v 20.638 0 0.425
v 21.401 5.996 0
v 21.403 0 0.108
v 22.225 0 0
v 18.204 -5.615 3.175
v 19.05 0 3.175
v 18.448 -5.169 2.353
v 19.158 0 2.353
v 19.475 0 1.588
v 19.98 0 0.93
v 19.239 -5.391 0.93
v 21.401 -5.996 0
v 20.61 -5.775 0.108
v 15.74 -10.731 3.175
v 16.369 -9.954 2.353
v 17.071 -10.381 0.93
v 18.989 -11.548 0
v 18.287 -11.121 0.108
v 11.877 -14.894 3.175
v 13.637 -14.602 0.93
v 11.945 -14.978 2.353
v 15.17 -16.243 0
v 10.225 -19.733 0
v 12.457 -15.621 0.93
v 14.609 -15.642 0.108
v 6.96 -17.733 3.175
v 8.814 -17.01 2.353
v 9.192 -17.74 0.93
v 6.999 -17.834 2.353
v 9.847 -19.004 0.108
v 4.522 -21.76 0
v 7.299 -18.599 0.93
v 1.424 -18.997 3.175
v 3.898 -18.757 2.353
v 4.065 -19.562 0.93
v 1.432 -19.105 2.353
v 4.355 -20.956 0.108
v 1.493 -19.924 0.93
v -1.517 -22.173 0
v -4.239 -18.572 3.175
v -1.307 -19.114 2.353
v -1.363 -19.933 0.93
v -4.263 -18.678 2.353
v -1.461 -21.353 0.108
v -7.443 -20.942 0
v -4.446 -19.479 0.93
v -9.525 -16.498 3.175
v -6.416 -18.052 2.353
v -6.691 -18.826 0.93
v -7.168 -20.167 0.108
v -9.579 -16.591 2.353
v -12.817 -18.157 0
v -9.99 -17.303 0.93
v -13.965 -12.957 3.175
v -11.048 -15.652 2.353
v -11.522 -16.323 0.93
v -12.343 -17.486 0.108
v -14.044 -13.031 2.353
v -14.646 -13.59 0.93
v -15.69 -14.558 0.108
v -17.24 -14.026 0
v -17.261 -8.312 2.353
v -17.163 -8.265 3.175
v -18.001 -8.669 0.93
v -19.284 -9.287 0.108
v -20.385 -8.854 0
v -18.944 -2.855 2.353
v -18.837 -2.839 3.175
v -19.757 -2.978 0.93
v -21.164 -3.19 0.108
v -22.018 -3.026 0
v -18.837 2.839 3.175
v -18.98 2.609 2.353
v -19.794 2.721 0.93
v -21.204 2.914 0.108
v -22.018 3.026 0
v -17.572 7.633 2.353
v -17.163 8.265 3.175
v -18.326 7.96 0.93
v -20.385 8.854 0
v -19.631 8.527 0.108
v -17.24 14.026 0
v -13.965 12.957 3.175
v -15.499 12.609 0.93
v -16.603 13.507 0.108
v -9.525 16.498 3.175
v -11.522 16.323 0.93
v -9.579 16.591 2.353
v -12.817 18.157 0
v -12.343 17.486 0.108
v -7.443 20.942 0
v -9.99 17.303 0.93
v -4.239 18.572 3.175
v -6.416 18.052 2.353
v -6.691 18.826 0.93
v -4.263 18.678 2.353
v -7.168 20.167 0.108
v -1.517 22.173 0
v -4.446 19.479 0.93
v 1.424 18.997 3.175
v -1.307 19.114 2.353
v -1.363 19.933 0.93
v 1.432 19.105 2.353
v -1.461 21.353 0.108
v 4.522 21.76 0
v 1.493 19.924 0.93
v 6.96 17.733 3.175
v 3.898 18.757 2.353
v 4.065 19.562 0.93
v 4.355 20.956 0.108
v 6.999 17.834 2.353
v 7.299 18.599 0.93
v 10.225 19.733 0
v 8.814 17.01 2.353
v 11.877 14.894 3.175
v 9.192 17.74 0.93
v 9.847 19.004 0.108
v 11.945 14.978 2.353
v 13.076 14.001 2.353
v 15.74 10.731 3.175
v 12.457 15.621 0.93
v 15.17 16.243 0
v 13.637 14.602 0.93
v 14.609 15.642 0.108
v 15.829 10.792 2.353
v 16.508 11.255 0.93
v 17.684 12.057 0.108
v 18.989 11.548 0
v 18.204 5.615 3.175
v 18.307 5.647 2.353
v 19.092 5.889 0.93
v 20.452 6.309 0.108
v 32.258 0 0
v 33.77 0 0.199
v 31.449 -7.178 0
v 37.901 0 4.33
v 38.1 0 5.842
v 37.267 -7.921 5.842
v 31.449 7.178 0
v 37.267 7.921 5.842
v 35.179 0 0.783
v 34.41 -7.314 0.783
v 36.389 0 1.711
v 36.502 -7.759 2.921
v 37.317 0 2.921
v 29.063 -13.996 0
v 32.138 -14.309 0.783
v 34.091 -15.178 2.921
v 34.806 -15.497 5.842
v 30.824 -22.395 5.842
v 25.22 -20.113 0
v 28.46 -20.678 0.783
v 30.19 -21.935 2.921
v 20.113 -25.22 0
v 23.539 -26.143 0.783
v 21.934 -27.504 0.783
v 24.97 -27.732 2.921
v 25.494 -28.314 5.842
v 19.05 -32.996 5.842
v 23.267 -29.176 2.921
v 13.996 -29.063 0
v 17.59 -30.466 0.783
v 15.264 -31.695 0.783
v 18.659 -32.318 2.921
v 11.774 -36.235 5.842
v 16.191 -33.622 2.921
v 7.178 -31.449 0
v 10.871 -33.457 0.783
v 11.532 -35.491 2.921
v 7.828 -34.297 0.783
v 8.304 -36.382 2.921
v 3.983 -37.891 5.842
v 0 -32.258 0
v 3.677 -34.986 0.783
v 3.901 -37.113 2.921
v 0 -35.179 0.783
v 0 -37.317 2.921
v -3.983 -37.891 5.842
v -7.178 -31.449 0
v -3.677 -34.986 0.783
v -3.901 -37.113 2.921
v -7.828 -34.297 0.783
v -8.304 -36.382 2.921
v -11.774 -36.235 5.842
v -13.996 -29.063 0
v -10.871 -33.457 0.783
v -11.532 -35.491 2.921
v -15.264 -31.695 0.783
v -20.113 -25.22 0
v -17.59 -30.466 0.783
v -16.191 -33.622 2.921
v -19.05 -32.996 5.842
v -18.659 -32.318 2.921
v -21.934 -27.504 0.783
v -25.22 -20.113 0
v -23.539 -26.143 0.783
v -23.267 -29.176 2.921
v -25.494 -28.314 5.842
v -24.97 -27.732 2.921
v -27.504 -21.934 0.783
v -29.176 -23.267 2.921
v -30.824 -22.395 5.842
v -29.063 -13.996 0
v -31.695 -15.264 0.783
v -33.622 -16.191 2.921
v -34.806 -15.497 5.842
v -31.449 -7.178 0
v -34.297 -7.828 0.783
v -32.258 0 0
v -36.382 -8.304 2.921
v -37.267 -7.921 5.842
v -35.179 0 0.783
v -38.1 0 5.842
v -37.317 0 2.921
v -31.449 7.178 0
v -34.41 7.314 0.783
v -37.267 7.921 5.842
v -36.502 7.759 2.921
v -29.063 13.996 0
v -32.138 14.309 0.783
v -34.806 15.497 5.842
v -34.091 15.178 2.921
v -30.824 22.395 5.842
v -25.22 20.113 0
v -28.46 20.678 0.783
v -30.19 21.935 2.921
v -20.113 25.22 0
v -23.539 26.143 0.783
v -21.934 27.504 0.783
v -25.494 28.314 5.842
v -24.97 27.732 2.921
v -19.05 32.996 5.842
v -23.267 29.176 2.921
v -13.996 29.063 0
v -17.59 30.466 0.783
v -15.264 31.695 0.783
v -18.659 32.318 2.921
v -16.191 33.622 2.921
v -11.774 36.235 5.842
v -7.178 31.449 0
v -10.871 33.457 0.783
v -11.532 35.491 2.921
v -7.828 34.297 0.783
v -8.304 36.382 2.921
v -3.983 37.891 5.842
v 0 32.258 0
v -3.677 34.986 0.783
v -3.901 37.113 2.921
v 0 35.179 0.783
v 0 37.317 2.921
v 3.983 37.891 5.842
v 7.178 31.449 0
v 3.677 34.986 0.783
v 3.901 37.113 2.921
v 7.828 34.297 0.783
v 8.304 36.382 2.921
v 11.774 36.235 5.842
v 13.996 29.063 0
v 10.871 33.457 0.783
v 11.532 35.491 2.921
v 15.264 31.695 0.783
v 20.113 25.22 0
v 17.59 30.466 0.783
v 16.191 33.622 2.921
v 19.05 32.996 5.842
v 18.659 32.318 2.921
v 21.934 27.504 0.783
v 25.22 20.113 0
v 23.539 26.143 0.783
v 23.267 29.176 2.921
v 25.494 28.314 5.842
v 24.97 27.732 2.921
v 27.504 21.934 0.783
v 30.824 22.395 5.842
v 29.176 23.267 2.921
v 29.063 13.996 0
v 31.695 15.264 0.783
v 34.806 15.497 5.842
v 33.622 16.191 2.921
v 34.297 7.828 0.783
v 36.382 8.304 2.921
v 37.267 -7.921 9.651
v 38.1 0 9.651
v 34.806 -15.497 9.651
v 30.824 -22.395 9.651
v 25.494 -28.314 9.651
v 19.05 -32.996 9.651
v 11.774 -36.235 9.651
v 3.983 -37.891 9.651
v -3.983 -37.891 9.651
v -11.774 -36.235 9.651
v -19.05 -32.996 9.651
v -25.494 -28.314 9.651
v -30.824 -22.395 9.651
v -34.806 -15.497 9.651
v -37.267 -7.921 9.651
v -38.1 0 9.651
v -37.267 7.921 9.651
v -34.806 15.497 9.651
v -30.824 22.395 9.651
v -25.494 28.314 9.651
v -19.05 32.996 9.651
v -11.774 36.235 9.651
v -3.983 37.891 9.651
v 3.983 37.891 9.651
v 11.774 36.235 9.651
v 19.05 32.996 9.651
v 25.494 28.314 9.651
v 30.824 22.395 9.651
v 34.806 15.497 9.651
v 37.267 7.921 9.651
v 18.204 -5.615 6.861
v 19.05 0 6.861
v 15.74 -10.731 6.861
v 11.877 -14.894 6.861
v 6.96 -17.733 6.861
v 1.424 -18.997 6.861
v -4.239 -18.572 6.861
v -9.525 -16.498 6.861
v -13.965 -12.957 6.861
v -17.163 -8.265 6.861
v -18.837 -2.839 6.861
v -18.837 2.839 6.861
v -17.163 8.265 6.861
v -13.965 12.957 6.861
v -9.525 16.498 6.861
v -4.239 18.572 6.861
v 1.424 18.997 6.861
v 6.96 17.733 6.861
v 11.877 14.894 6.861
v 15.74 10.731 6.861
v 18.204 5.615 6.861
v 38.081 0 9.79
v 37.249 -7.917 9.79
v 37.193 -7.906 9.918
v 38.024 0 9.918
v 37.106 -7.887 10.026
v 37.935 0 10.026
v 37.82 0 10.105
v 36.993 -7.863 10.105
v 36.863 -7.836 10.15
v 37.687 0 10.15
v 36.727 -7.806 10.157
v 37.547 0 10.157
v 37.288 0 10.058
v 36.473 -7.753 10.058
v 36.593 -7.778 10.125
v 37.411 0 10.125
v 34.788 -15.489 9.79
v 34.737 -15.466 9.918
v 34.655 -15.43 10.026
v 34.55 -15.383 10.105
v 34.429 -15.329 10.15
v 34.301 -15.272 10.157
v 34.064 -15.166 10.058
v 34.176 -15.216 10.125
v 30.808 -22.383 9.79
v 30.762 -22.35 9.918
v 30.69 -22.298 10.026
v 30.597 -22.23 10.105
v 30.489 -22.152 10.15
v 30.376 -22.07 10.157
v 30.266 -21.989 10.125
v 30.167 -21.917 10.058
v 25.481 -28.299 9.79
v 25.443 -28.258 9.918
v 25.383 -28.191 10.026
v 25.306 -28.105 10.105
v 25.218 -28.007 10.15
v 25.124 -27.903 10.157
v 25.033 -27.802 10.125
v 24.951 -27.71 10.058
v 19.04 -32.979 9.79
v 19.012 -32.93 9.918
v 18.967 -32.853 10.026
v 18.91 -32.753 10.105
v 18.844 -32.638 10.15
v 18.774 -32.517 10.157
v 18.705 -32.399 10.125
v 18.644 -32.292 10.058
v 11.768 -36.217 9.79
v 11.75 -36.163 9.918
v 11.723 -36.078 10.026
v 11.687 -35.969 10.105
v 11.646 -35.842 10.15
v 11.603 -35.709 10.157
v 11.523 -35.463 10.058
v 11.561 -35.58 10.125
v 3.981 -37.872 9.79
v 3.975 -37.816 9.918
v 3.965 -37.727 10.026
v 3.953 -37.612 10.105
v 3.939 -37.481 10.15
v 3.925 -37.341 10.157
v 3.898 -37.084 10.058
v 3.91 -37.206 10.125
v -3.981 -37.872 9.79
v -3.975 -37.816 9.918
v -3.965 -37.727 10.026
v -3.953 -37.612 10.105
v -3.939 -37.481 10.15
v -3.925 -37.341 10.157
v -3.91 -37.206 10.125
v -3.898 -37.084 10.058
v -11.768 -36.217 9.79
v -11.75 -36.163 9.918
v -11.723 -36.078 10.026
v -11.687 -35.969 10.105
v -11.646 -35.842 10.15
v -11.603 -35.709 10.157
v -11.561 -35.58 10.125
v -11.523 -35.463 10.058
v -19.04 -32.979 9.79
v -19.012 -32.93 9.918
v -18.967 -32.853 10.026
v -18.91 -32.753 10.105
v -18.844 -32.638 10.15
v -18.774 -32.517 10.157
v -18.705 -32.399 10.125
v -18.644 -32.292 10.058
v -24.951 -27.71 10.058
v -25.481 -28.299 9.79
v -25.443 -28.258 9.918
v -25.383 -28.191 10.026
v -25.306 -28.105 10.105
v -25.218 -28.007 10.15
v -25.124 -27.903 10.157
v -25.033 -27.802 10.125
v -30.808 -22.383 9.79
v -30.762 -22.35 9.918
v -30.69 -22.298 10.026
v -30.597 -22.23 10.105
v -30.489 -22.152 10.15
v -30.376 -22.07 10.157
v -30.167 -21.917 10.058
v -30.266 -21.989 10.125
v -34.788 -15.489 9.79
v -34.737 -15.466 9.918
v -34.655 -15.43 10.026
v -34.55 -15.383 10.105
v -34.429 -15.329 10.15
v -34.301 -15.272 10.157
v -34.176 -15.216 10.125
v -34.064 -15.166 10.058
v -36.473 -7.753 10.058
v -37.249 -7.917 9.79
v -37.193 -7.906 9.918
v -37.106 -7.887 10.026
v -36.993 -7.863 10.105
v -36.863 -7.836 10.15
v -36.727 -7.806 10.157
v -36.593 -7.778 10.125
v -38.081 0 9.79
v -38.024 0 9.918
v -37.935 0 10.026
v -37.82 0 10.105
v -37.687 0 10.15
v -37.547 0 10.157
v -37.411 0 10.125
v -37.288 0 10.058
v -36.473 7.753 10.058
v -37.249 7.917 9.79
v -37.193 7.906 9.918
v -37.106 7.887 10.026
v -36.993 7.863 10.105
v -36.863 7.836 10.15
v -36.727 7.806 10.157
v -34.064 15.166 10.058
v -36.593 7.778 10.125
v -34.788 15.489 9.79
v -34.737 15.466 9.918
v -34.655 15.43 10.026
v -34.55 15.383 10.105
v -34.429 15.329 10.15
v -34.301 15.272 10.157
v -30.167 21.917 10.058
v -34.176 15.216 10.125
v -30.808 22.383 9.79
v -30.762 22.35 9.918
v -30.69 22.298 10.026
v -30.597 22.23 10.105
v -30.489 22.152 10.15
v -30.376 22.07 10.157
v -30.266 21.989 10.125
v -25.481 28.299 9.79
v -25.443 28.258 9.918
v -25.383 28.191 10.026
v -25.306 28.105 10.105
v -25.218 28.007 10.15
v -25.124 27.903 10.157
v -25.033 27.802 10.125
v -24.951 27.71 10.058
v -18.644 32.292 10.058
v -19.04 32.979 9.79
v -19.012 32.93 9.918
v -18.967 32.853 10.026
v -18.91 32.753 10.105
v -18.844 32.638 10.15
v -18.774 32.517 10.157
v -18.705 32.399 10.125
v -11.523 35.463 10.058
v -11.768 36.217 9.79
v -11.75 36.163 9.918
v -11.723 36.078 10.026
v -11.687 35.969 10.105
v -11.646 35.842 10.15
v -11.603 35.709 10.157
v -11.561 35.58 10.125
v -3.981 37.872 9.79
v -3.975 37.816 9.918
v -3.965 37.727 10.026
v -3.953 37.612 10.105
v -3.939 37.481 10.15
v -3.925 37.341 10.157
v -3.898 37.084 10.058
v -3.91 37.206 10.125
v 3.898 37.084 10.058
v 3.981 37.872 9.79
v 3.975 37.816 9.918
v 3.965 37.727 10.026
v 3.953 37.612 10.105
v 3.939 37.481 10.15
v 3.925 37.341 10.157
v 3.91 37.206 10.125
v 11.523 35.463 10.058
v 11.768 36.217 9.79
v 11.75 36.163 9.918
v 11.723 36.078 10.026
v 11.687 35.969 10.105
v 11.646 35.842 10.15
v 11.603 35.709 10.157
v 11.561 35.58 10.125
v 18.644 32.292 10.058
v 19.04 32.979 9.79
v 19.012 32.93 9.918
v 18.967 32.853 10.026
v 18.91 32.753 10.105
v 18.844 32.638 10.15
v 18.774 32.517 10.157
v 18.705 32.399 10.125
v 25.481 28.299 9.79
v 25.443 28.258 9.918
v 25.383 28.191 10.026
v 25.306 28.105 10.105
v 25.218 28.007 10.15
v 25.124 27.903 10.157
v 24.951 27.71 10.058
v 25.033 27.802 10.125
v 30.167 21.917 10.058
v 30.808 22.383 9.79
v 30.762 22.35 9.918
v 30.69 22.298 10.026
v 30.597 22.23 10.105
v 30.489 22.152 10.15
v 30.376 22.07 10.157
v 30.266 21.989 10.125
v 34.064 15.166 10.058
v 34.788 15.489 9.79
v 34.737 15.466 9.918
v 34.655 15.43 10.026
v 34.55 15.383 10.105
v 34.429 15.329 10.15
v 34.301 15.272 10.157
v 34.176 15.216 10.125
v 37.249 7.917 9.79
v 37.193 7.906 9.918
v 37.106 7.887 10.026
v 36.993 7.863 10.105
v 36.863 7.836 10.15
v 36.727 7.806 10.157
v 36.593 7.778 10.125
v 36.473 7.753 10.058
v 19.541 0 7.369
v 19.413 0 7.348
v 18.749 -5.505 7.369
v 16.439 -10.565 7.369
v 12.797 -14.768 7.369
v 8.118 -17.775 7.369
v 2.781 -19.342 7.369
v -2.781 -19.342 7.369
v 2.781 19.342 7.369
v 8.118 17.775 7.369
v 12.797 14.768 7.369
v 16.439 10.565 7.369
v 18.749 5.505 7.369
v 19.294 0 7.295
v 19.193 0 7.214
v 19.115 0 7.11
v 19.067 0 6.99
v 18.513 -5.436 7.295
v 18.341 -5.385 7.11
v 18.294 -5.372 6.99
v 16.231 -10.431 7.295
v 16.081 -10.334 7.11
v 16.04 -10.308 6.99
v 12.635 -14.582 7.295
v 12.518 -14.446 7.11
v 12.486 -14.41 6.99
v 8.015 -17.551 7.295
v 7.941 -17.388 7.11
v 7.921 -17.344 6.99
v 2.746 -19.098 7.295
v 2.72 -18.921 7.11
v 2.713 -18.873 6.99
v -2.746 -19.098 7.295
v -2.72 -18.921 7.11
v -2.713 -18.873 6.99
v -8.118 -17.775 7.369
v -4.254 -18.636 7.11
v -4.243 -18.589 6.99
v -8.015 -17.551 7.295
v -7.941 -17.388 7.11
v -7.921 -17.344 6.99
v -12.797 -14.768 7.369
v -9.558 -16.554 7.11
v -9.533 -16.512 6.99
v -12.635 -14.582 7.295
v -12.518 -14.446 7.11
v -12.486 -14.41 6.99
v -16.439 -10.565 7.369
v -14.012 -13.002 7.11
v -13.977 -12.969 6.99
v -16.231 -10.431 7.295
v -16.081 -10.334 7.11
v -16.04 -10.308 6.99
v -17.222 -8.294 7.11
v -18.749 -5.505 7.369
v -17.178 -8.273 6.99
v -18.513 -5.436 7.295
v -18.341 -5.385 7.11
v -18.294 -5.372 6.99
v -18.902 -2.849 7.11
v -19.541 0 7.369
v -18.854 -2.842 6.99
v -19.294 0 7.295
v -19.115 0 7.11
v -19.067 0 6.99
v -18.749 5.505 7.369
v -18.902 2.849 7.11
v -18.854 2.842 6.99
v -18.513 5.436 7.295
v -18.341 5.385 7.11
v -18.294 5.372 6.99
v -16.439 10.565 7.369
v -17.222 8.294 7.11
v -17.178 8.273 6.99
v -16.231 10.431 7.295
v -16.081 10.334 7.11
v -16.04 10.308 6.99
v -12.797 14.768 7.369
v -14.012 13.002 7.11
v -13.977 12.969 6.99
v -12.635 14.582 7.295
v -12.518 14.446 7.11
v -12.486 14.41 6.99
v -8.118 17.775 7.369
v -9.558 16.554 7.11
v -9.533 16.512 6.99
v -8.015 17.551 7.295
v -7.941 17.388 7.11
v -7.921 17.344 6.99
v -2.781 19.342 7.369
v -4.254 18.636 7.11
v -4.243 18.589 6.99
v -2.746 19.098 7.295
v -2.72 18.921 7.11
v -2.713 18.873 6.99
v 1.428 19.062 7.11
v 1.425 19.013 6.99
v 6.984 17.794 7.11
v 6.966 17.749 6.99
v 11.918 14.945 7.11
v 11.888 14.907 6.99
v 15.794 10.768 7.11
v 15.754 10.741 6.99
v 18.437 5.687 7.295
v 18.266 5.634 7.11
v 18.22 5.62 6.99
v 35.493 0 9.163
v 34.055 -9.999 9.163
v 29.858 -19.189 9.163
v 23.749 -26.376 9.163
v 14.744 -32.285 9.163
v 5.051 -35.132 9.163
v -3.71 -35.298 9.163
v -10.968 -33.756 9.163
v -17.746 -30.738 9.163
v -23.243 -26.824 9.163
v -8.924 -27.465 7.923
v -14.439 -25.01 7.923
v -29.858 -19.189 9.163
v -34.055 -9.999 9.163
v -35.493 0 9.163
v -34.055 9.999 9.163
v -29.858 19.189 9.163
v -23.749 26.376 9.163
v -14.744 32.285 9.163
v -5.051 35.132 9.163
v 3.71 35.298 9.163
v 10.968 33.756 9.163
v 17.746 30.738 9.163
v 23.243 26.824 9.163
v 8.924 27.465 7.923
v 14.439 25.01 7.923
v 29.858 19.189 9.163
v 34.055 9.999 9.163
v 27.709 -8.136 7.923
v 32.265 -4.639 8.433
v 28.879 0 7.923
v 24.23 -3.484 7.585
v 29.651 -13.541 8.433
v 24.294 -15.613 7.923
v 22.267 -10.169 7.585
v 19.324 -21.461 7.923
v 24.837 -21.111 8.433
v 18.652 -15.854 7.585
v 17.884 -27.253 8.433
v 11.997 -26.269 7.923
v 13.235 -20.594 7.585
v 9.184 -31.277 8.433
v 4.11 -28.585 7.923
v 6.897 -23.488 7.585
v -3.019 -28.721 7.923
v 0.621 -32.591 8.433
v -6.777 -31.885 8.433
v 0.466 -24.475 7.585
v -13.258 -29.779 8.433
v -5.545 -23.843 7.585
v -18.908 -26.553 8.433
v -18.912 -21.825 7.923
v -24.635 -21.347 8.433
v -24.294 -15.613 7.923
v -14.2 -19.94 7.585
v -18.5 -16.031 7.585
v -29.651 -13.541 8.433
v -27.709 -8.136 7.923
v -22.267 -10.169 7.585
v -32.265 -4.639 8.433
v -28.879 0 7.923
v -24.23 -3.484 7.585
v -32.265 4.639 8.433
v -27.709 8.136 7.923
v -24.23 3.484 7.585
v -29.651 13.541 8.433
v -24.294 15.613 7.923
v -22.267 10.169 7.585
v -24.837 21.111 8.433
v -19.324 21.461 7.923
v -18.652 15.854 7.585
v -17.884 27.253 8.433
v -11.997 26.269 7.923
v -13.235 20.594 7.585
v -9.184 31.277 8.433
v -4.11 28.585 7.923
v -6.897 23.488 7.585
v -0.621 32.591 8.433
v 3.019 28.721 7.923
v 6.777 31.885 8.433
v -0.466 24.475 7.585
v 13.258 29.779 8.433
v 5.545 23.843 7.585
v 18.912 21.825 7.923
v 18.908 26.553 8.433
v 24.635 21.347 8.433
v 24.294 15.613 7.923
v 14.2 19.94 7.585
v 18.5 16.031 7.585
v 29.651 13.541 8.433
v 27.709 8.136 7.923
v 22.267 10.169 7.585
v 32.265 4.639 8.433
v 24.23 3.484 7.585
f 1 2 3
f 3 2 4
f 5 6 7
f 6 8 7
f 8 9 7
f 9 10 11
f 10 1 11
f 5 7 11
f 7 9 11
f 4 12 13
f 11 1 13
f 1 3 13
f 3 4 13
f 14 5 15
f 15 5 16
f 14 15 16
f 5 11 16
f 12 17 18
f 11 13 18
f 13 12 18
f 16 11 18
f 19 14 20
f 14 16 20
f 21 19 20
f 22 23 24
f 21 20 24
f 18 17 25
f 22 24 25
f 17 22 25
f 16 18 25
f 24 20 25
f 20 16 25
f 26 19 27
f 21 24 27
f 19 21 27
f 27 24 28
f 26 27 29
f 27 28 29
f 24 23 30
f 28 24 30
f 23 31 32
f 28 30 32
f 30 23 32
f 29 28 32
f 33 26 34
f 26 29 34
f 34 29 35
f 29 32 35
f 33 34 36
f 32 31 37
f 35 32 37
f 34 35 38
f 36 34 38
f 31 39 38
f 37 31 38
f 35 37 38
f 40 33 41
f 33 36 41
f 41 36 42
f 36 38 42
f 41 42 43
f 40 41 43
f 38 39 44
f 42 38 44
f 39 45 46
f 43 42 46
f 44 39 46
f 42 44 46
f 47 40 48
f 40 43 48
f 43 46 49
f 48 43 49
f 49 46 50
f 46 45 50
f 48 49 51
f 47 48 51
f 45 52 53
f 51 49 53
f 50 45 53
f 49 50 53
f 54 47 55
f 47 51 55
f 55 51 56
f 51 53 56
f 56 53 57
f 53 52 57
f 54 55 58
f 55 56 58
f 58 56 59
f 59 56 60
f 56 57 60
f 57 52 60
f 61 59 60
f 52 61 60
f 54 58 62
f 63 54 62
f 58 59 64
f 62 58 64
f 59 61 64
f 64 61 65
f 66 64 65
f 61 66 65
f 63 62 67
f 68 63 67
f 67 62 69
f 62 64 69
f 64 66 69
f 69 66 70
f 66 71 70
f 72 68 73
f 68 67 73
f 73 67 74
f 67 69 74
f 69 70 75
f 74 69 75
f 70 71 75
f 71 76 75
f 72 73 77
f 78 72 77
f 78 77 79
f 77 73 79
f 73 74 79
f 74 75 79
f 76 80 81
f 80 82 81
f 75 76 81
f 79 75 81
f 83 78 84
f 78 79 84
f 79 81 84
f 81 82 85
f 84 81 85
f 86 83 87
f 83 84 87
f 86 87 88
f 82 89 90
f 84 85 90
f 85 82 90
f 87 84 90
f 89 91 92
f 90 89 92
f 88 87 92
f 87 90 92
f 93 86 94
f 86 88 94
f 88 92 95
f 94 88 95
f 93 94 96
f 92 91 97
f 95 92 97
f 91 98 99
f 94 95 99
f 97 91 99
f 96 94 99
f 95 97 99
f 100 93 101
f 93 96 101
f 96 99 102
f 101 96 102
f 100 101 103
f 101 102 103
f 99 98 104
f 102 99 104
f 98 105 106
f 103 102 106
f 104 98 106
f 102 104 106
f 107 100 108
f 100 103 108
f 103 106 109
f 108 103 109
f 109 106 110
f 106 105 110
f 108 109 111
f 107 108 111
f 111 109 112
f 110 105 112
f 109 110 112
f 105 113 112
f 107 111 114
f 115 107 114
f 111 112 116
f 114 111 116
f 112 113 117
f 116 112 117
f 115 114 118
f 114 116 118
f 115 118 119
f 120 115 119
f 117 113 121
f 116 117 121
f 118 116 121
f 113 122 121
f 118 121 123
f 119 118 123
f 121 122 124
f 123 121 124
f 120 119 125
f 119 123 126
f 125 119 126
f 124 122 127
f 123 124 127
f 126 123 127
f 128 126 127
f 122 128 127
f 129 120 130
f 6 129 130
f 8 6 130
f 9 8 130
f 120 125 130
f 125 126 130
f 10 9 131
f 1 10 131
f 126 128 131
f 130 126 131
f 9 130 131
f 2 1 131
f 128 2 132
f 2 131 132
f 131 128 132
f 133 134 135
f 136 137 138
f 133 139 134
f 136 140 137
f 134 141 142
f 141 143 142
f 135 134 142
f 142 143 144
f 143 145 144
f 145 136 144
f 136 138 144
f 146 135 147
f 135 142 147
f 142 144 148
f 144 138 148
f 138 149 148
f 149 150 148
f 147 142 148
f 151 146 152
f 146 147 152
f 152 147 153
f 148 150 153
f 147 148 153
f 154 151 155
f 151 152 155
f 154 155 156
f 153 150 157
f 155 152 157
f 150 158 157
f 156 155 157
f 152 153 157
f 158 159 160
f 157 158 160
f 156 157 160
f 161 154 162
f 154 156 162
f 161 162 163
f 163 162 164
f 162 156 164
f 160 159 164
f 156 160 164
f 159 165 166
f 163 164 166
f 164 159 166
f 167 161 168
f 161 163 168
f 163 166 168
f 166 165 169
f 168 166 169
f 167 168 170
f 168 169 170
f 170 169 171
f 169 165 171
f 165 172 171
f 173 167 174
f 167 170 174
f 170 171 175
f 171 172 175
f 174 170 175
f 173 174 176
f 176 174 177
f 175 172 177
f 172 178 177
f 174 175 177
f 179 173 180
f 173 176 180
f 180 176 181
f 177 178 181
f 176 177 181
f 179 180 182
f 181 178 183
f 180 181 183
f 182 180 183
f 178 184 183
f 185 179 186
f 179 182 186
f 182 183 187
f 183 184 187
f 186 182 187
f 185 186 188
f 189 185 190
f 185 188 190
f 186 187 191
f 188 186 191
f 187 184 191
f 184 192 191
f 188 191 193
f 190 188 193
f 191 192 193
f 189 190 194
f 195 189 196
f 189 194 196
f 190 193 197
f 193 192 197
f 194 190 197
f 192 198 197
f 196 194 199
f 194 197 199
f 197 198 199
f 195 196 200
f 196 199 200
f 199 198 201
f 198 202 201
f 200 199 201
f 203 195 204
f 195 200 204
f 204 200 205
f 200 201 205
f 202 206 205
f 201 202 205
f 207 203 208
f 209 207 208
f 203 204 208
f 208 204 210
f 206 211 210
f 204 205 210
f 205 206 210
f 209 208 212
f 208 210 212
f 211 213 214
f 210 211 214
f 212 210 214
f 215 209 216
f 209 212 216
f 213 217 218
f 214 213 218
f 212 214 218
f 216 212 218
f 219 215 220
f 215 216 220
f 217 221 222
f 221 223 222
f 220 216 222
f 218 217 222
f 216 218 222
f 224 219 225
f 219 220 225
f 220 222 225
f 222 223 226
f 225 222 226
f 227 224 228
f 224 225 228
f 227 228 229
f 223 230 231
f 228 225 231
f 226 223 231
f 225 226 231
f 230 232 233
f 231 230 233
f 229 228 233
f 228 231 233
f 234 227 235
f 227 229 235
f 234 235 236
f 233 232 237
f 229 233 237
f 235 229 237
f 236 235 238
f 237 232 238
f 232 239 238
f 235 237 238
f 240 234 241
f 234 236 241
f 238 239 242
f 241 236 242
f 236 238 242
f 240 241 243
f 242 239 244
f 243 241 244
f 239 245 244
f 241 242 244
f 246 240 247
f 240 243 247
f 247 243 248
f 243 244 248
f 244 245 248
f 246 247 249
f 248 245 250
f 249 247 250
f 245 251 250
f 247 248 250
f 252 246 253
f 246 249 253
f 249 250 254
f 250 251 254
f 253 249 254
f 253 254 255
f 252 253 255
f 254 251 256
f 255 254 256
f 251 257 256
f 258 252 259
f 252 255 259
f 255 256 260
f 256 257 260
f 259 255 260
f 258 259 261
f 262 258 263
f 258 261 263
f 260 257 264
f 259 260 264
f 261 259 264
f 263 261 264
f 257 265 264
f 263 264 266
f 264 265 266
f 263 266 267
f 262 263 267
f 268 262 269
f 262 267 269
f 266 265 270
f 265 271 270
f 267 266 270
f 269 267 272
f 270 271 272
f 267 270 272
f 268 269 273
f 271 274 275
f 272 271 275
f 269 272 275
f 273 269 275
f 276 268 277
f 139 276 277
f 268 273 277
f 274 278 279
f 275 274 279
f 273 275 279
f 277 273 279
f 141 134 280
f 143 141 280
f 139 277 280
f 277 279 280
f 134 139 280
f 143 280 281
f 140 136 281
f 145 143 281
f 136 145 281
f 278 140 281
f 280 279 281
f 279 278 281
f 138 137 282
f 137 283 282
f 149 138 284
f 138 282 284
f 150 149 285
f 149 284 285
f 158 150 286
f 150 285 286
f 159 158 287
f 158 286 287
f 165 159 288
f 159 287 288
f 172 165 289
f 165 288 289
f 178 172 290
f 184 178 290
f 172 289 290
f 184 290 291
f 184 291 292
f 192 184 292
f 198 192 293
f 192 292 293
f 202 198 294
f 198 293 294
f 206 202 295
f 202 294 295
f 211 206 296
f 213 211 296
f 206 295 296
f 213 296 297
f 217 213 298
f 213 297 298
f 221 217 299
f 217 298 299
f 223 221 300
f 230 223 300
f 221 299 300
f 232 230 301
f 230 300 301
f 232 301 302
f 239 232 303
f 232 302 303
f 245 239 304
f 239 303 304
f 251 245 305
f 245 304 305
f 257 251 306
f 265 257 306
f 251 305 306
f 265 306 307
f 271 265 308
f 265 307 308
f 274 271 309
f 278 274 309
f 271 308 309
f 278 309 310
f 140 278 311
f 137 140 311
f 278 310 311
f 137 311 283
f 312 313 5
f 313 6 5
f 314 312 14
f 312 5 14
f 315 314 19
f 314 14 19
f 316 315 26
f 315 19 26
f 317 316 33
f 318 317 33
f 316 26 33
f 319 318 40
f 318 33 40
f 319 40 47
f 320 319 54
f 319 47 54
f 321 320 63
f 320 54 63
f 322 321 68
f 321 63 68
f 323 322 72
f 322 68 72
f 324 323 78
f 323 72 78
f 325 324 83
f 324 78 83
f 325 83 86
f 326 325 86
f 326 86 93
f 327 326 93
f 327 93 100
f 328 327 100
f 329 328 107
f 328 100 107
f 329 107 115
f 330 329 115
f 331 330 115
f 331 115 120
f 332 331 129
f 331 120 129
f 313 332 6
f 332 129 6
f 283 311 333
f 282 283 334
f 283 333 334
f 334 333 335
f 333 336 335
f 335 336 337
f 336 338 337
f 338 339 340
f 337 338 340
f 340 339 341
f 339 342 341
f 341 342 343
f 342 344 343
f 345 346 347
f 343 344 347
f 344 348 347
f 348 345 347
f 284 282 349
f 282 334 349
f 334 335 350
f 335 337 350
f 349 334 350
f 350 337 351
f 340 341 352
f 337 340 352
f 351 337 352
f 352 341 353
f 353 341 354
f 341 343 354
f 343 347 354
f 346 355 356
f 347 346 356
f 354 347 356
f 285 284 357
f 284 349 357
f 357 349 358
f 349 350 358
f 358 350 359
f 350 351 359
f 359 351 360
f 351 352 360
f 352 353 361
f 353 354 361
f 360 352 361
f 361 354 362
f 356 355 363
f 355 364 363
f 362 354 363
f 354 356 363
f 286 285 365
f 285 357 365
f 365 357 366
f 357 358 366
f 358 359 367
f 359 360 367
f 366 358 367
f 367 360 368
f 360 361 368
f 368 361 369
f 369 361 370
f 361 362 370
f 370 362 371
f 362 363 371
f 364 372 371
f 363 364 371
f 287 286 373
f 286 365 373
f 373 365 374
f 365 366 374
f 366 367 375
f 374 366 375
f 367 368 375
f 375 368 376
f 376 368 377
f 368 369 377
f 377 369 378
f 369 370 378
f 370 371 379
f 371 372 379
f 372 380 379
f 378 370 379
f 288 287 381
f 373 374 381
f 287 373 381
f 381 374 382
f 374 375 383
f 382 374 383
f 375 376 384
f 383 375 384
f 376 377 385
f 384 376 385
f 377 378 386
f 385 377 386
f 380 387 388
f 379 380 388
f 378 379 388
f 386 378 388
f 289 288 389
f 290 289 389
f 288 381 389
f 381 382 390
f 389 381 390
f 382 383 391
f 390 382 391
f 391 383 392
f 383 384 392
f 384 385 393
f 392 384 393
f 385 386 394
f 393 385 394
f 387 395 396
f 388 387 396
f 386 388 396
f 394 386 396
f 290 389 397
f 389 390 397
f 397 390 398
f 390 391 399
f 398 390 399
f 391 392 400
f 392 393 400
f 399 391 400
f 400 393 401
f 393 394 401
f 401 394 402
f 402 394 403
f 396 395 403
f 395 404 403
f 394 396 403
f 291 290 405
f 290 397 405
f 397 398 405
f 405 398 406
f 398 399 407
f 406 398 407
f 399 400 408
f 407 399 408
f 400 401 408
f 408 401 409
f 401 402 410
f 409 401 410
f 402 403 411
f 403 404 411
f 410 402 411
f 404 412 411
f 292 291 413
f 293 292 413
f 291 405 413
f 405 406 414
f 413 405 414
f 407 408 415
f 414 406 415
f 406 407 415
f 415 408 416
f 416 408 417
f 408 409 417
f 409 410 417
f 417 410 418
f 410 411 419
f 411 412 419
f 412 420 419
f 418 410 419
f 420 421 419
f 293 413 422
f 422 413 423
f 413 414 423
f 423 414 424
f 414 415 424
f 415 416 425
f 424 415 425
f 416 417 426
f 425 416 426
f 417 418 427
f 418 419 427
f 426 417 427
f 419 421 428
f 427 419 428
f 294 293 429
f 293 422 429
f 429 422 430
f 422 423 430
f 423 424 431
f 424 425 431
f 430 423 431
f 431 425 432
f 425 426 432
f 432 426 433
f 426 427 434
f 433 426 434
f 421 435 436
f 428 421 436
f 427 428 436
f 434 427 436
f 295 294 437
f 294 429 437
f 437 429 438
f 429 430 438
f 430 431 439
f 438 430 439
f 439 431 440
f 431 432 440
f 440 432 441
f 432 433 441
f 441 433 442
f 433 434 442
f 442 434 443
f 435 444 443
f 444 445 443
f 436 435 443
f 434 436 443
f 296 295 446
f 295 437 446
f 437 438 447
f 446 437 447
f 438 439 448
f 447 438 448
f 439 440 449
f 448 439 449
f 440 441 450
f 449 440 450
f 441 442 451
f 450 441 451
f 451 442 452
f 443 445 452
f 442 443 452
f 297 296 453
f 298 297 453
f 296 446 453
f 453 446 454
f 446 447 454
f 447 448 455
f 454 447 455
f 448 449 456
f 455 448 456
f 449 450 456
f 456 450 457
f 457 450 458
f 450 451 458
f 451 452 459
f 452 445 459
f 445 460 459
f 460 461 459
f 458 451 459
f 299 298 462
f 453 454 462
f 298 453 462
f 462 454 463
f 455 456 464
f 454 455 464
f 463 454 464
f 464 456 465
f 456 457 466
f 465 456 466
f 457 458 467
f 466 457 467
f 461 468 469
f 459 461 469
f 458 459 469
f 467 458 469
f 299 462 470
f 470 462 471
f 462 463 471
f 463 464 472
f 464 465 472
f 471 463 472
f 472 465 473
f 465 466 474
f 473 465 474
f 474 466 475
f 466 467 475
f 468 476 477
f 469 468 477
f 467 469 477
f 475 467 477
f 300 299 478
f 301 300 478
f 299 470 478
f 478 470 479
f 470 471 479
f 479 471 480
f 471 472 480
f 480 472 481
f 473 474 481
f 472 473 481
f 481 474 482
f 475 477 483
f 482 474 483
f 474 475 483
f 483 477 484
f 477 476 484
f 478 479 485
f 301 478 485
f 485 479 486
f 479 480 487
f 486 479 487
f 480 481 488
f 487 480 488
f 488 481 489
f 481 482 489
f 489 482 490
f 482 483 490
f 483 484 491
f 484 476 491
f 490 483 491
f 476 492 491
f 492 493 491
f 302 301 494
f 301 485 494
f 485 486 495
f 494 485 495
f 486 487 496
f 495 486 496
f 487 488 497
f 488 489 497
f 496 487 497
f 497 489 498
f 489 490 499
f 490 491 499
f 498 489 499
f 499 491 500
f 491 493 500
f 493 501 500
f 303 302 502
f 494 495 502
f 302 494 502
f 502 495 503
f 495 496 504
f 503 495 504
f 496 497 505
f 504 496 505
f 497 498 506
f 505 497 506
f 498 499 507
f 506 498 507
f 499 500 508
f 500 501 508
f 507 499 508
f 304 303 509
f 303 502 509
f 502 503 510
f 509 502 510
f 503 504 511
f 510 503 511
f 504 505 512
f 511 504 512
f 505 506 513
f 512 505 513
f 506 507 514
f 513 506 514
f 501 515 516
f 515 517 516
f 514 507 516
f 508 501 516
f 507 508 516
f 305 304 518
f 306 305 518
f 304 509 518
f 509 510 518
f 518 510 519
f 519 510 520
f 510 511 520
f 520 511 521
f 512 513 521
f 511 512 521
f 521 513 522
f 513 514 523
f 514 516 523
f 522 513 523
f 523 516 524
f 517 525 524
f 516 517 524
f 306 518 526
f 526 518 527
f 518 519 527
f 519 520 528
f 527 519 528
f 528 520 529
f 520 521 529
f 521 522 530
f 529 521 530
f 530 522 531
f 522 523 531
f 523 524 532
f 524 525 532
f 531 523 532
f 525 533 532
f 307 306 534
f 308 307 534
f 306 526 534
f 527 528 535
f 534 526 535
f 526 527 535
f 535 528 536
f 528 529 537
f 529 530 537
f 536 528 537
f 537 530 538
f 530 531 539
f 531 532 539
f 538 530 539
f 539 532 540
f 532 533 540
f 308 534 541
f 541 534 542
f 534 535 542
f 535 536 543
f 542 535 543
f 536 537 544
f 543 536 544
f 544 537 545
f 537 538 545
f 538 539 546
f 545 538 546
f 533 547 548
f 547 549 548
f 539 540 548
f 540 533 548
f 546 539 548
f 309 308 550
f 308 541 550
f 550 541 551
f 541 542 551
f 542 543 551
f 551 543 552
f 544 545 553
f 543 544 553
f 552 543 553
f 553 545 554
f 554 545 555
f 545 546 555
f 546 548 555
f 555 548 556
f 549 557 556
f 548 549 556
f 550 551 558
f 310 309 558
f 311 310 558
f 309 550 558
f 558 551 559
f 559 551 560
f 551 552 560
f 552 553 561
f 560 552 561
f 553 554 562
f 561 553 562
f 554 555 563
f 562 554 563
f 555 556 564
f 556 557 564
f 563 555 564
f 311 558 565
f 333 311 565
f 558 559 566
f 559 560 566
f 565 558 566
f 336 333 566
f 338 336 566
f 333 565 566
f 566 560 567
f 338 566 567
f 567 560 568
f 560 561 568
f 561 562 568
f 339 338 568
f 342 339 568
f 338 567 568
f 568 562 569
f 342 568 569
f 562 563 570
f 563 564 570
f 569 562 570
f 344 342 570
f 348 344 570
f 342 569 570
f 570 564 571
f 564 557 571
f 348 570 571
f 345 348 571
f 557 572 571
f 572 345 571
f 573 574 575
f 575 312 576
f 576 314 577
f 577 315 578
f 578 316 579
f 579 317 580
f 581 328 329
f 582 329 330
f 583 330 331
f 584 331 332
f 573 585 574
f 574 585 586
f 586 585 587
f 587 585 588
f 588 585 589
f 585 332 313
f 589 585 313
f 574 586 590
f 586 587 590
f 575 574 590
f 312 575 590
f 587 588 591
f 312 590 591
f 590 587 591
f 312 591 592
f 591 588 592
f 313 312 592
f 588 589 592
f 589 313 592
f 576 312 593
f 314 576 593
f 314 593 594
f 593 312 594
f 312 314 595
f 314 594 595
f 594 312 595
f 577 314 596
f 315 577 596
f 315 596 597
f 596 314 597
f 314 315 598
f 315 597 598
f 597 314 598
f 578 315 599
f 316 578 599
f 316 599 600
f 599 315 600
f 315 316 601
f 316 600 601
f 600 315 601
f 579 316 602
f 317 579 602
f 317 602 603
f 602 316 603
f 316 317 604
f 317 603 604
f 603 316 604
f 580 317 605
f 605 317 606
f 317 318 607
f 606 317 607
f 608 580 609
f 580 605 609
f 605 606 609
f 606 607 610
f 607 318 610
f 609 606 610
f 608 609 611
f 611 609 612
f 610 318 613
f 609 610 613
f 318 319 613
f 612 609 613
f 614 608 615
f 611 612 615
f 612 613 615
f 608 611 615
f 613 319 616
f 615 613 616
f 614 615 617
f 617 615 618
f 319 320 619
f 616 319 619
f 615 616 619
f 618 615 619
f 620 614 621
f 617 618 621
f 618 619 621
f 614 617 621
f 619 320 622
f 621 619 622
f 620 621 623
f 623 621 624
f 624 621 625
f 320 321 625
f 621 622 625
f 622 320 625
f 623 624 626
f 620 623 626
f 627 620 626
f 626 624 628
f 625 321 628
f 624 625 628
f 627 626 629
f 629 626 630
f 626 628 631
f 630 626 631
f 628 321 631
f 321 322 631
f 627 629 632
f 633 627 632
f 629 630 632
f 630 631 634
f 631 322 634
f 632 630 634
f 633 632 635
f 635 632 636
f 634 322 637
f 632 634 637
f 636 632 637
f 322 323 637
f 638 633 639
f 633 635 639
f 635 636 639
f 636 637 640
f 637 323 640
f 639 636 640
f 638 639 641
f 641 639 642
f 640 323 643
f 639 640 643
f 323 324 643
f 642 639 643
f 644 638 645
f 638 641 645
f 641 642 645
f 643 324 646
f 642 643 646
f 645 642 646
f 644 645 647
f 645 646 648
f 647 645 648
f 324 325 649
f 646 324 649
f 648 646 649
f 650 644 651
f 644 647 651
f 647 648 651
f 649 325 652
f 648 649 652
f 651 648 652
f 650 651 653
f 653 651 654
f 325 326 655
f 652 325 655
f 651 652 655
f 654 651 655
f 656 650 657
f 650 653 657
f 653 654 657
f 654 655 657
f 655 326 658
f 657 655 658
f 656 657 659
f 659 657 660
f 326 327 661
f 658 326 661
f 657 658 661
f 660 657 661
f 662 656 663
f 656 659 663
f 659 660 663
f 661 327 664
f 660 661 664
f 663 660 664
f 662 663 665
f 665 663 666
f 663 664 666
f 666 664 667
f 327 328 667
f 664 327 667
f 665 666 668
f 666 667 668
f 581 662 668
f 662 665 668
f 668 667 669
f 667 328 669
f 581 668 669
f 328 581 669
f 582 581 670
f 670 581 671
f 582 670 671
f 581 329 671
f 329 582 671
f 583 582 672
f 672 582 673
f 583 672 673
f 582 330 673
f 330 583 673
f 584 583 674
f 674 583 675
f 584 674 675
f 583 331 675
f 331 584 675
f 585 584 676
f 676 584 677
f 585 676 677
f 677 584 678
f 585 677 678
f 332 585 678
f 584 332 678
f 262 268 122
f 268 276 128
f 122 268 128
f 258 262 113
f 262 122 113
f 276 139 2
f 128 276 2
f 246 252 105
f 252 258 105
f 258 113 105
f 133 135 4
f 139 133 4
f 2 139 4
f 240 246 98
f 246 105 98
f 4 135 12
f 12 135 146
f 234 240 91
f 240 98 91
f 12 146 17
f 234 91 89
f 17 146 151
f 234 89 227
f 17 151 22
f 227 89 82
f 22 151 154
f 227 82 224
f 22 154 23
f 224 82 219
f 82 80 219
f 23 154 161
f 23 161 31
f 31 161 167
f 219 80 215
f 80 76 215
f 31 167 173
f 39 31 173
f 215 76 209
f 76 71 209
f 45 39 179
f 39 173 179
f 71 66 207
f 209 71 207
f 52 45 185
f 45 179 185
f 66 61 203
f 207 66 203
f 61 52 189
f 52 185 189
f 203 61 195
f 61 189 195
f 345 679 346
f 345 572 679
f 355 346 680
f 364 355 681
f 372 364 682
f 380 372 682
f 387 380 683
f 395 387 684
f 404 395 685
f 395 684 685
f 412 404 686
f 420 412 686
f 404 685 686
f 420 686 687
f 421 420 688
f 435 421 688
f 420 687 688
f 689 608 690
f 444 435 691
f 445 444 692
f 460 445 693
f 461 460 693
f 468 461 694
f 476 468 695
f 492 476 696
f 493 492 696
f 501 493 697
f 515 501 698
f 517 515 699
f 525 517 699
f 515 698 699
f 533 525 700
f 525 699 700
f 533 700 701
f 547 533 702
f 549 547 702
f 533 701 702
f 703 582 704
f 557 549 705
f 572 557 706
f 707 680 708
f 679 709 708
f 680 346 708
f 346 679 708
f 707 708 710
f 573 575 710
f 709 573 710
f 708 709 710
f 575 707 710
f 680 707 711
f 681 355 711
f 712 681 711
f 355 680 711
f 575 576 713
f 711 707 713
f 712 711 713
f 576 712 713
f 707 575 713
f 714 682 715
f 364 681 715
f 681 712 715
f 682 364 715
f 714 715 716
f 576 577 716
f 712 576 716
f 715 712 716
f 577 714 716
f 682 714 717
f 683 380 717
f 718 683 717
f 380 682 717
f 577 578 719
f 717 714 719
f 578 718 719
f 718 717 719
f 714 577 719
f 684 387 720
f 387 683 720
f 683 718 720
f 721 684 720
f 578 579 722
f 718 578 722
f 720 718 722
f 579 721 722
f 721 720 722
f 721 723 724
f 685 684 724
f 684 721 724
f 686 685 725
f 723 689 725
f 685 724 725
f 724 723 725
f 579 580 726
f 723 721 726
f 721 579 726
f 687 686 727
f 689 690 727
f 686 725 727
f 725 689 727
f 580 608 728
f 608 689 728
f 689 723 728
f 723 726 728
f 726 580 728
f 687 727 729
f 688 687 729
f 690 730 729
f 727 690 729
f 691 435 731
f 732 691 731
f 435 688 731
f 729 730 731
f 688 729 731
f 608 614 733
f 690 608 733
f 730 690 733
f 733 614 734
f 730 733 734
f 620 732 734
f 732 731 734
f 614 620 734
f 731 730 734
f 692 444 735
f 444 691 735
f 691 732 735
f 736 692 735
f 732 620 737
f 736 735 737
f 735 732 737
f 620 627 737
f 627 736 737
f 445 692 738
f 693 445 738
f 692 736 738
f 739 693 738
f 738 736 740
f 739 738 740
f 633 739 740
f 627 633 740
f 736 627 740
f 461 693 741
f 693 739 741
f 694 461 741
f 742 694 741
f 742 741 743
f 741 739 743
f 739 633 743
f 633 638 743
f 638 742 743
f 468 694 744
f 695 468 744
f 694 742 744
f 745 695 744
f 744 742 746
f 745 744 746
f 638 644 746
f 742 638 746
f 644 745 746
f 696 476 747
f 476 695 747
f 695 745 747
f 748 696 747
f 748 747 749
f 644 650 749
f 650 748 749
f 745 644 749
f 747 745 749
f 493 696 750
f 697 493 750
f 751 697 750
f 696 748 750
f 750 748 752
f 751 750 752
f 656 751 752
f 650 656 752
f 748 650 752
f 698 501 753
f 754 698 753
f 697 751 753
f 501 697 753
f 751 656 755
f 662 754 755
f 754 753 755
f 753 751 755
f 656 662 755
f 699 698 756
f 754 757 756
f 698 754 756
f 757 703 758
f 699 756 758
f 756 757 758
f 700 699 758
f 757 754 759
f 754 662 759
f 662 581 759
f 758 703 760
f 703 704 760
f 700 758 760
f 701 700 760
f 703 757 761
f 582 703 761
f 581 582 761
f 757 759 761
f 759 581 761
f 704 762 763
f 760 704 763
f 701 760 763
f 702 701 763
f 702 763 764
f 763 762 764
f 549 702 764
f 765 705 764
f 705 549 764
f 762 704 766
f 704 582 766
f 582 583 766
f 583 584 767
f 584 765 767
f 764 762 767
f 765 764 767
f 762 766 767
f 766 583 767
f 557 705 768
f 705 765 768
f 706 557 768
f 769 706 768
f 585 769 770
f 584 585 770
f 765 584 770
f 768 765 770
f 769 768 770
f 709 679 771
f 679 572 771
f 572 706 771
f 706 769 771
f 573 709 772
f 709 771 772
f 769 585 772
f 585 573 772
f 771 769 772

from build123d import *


with BuildPart() as f1:
    # F0 (on Front) → F1 (revolve)
    with BuildSketch(Plane.XZ):
        with BuildLine():
            ThreePointArc((19.05, 3.175), (19.979936, 0.929936), (22.225, 0))
            Line((22.225, 0), (32.258, 0))
            ThreePointArc((32.258, 0), (36.388918, 1.711082), (38.1, 5.842))
            Line((38.1, 5.842), (38.1, 9.650897))
            ThreePointArc((38.1, 9.650897), (37.819646, 10.105035), (37.288026, 10.057915))
            add(Edge.make_bspline(
                [(37.288026, 10.057915), (34.82722, 8.220108), (27.981587, 7.651321), (19.540988, 7.368505)],
                knots=[3.140852, 3.140852, 3.140852, 3.140852, 23.652781, 23.652781, 23.652781, 23.652781], degree=3))
            ThreePointArc((19.540988, 7.368505), (19.192825, 7.213935), (19.05, 6.86079))
            Line((19.05, 6.86079), (19.05, 3.175))
        make_face()
    revolve(axis=Axis((0, 0, 5.49747), (0, 0, -1)))


solid = f1.part
